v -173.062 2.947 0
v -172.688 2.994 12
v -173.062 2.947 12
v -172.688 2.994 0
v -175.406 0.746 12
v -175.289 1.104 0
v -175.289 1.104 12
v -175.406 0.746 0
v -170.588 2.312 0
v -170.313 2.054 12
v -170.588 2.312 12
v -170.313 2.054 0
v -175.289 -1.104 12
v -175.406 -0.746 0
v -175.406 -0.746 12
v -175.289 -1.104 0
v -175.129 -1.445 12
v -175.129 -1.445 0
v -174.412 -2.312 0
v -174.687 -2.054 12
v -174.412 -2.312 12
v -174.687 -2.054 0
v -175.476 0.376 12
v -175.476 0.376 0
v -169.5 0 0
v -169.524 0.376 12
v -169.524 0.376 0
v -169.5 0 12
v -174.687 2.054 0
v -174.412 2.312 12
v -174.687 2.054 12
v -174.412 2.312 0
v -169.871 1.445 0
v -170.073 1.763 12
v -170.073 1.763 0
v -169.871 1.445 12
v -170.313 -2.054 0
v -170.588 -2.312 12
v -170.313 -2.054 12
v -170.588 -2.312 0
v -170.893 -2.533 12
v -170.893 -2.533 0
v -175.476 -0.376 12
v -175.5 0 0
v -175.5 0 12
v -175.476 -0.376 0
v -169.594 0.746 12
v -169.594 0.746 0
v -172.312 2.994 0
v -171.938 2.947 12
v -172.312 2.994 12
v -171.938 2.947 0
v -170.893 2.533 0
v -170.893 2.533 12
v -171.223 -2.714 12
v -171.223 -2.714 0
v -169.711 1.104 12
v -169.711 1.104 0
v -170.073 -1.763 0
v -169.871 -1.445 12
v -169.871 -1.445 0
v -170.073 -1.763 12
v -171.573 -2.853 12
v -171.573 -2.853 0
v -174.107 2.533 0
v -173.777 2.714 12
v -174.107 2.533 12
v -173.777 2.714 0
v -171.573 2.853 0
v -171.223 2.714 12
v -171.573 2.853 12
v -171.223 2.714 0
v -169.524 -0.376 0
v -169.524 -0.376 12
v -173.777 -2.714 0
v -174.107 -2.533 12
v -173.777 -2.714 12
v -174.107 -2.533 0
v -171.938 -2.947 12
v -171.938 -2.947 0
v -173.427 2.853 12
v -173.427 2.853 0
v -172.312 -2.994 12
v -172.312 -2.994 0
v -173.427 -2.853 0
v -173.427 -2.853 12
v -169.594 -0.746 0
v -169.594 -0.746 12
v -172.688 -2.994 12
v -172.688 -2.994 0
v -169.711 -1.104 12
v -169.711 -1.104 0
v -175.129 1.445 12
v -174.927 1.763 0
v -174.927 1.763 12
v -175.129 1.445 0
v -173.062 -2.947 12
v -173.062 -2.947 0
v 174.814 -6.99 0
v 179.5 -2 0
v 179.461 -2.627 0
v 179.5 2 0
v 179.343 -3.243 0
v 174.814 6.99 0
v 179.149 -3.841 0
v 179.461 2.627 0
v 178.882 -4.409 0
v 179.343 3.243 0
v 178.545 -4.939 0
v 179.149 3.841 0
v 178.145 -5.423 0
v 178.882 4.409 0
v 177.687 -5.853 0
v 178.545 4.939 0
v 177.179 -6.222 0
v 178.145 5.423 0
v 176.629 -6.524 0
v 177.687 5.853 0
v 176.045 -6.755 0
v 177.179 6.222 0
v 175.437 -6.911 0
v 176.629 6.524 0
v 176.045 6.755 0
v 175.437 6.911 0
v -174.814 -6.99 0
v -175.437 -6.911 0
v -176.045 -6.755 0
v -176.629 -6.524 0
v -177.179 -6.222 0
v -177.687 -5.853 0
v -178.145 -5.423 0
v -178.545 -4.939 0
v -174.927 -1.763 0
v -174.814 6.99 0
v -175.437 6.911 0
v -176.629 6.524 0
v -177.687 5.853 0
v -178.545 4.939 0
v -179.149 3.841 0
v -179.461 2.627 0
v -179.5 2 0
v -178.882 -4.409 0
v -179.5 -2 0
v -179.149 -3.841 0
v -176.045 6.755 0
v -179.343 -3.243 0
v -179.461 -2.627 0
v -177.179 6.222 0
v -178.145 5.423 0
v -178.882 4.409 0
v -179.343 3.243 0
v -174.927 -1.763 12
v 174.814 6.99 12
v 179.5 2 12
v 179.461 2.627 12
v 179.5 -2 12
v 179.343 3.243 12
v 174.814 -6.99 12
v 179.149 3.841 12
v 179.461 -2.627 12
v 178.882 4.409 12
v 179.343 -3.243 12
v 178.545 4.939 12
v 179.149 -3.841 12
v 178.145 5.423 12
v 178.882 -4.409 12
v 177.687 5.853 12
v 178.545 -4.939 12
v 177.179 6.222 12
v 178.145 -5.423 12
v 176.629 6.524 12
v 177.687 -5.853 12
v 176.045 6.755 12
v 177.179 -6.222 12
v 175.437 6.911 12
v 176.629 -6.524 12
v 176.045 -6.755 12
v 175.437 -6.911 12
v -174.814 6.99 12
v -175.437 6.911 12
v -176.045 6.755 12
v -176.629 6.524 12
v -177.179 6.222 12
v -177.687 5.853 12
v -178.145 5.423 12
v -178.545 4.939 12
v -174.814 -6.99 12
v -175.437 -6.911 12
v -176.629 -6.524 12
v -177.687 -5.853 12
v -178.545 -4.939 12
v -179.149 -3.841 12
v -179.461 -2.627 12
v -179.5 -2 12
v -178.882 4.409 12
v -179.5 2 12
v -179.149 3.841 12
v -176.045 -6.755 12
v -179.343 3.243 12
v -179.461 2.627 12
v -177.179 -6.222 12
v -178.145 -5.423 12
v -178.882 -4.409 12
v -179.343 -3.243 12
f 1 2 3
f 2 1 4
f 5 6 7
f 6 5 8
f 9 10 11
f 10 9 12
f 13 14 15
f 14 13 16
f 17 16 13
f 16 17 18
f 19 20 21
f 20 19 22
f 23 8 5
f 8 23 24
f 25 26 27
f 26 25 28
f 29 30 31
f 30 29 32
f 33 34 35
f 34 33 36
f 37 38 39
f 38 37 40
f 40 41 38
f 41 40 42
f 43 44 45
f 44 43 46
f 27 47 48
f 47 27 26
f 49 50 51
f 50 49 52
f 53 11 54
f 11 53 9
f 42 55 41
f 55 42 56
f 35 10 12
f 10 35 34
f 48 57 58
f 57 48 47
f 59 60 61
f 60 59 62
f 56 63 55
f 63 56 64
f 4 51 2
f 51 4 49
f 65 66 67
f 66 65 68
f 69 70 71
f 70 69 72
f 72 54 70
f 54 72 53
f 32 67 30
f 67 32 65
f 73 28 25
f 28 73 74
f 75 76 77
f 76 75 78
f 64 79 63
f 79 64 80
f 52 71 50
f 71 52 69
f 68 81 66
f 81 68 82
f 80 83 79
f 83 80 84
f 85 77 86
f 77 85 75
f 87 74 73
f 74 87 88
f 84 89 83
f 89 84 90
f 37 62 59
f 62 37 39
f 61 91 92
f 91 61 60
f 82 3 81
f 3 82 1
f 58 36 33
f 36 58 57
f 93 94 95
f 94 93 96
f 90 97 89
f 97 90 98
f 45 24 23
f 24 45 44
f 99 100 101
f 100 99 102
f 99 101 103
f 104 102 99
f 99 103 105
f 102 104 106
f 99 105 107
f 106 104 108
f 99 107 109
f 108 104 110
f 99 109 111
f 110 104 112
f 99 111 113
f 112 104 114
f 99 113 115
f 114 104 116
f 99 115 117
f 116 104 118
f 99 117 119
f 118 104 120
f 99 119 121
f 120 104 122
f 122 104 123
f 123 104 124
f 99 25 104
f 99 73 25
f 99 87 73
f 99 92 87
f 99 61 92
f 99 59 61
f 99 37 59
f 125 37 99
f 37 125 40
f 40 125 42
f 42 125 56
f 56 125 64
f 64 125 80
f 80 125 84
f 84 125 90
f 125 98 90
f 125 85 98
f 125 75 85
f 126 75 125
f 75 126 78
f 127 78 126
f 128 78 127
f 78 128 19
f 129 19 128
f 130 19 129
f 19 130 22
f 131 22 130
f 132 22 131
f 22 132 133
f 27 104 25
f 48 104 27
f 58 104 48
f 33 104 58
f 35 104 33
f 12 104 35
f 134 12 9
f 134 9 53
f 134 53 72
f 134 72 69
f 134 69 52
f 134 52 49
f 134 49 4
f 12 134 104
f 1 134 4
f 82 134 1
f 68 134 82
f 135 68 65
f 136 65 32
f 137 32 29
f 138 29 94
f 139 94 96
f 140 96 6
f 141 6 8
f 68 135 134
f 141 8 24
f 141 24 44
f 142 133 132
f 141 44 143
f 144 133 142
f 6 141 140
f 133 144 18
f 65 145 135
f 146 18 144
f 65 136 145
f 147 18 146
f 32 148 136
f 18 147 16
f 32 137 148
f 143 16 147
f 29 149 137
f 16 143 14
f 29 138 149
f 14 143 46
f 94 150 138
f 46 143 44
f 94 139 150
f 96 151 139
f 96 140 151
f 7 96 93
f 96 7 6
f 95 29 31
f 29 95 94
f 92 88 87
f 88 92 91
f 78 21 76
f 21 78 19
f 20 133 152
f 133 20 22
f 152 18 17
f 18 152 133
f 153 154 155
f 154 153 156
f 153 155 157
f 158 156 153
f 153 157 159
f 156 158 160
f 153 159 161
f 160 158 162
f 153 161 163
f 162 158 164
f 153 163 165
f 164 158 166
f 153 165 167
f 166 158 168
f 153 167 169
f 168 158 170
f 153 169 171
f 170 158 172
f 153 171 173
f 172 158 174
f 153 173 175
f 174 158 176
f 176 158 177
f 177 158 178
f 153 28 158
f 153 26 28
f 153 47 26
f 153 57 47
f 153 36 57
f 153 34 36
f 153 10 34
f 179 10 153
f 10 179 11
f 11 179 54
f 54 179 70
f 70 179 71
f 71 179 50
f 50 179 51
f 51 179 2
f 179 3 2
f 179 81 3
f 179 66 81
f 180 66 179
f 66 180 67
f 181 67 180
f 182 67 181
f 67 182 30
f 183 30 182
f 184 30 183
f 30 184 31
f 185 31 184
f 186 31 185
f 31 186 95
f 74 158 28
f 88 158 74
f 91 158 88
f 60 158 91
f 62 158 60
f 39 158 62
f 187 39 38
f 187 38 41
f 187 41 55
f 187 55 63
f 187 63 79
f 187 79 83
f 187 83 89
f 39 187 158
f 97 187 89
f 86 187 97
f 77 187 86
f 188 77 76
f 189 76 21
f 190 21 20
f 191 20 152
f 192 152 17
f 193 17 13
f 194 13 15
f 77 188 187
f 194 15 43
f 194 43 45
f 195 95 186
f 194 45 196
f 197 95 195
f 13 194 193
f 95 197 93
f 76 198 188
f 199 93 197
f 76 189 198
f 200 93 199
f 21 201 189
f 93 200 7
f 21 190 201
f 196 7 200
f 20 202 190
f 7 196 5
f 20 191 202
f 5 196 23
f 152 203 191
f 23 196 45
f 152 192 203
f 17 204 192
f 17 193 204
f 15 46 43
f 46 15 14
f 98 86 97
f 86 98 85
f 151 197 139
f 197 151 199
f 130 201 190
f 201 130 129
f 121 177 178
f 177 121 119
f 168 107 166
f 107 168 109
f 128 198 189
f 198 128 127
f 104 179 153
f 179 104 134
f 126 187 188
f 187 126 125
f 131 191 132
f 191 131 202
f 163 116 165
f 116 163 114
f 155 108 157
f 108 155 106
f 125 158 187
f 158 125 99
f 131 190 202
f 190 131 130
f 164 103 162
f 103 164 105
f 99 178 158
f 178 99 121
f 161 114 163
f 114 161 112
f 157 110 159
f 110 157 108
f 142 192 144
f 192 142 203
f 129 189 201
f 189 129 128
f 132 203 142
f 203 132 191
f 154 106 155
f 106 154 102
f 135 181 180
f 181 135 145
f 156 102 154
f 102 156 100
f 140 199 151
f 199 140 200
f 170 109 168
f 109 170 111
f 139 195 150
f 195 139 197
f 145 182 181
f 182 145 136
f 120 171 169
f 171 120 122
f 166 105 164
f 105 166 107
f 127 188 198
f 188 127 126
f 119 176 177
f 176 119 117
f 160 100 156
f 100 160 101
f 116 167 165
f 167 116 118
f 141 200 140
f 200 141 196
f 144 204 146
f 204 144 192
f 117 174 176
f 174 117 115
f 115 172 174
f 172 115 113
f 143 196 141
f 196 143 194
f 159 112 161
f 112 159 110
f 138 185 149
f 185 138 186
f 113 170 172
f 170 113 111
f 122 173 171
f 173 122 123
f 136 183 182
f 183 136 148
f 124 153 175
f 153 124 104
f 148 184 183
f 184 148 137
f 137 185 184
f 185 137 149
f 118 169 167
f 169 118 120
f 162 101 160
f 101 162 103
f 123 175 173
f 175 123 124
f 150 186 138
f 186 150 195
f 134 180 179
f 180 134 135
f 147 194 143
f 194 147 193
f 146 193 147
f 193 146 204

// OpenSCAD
$fn = 50;


difference() {
	union() {
		hull() {
			translate(v = [-174.5000000000, 2.0000000000, 0]) {
				cylinder(h = 12, r = 5);
			}
			translate(v = [174.5000000000, 2.0000000000, 0]) {
				cylinder(h = 12, r = 5);
			}
			translate(v = [-174.5000000000, -2.0000000000, 0]) {
				cylinder(h = 12, r = 5);
			}
			translate(v = [174.5000000000, -2.0000000000, 0]) {
				cylinder(h = 12, r = 5);
			}
		}
	}
	union() {
		translate(v = [-172.5000000000, 0.0000000000, 0]) {
			cylinder(h = 12, r = 3.0000000000);
		}
		translate(v = [-172.5000000000, 0.0000000000, 0]) {
			cylinder(h = 12, r = 1.5000000000);
		}
		translate(v = [-172.5000000000, 0.0000000000, 0]) {
			cylinder(h = 12, r = 1.5000000000);
		}
		translate(v = [-172.5000000000, 0.0000000000, 0]) {
			cylinder(h = 12, r = 1.5000000000);
		}
	}
}
